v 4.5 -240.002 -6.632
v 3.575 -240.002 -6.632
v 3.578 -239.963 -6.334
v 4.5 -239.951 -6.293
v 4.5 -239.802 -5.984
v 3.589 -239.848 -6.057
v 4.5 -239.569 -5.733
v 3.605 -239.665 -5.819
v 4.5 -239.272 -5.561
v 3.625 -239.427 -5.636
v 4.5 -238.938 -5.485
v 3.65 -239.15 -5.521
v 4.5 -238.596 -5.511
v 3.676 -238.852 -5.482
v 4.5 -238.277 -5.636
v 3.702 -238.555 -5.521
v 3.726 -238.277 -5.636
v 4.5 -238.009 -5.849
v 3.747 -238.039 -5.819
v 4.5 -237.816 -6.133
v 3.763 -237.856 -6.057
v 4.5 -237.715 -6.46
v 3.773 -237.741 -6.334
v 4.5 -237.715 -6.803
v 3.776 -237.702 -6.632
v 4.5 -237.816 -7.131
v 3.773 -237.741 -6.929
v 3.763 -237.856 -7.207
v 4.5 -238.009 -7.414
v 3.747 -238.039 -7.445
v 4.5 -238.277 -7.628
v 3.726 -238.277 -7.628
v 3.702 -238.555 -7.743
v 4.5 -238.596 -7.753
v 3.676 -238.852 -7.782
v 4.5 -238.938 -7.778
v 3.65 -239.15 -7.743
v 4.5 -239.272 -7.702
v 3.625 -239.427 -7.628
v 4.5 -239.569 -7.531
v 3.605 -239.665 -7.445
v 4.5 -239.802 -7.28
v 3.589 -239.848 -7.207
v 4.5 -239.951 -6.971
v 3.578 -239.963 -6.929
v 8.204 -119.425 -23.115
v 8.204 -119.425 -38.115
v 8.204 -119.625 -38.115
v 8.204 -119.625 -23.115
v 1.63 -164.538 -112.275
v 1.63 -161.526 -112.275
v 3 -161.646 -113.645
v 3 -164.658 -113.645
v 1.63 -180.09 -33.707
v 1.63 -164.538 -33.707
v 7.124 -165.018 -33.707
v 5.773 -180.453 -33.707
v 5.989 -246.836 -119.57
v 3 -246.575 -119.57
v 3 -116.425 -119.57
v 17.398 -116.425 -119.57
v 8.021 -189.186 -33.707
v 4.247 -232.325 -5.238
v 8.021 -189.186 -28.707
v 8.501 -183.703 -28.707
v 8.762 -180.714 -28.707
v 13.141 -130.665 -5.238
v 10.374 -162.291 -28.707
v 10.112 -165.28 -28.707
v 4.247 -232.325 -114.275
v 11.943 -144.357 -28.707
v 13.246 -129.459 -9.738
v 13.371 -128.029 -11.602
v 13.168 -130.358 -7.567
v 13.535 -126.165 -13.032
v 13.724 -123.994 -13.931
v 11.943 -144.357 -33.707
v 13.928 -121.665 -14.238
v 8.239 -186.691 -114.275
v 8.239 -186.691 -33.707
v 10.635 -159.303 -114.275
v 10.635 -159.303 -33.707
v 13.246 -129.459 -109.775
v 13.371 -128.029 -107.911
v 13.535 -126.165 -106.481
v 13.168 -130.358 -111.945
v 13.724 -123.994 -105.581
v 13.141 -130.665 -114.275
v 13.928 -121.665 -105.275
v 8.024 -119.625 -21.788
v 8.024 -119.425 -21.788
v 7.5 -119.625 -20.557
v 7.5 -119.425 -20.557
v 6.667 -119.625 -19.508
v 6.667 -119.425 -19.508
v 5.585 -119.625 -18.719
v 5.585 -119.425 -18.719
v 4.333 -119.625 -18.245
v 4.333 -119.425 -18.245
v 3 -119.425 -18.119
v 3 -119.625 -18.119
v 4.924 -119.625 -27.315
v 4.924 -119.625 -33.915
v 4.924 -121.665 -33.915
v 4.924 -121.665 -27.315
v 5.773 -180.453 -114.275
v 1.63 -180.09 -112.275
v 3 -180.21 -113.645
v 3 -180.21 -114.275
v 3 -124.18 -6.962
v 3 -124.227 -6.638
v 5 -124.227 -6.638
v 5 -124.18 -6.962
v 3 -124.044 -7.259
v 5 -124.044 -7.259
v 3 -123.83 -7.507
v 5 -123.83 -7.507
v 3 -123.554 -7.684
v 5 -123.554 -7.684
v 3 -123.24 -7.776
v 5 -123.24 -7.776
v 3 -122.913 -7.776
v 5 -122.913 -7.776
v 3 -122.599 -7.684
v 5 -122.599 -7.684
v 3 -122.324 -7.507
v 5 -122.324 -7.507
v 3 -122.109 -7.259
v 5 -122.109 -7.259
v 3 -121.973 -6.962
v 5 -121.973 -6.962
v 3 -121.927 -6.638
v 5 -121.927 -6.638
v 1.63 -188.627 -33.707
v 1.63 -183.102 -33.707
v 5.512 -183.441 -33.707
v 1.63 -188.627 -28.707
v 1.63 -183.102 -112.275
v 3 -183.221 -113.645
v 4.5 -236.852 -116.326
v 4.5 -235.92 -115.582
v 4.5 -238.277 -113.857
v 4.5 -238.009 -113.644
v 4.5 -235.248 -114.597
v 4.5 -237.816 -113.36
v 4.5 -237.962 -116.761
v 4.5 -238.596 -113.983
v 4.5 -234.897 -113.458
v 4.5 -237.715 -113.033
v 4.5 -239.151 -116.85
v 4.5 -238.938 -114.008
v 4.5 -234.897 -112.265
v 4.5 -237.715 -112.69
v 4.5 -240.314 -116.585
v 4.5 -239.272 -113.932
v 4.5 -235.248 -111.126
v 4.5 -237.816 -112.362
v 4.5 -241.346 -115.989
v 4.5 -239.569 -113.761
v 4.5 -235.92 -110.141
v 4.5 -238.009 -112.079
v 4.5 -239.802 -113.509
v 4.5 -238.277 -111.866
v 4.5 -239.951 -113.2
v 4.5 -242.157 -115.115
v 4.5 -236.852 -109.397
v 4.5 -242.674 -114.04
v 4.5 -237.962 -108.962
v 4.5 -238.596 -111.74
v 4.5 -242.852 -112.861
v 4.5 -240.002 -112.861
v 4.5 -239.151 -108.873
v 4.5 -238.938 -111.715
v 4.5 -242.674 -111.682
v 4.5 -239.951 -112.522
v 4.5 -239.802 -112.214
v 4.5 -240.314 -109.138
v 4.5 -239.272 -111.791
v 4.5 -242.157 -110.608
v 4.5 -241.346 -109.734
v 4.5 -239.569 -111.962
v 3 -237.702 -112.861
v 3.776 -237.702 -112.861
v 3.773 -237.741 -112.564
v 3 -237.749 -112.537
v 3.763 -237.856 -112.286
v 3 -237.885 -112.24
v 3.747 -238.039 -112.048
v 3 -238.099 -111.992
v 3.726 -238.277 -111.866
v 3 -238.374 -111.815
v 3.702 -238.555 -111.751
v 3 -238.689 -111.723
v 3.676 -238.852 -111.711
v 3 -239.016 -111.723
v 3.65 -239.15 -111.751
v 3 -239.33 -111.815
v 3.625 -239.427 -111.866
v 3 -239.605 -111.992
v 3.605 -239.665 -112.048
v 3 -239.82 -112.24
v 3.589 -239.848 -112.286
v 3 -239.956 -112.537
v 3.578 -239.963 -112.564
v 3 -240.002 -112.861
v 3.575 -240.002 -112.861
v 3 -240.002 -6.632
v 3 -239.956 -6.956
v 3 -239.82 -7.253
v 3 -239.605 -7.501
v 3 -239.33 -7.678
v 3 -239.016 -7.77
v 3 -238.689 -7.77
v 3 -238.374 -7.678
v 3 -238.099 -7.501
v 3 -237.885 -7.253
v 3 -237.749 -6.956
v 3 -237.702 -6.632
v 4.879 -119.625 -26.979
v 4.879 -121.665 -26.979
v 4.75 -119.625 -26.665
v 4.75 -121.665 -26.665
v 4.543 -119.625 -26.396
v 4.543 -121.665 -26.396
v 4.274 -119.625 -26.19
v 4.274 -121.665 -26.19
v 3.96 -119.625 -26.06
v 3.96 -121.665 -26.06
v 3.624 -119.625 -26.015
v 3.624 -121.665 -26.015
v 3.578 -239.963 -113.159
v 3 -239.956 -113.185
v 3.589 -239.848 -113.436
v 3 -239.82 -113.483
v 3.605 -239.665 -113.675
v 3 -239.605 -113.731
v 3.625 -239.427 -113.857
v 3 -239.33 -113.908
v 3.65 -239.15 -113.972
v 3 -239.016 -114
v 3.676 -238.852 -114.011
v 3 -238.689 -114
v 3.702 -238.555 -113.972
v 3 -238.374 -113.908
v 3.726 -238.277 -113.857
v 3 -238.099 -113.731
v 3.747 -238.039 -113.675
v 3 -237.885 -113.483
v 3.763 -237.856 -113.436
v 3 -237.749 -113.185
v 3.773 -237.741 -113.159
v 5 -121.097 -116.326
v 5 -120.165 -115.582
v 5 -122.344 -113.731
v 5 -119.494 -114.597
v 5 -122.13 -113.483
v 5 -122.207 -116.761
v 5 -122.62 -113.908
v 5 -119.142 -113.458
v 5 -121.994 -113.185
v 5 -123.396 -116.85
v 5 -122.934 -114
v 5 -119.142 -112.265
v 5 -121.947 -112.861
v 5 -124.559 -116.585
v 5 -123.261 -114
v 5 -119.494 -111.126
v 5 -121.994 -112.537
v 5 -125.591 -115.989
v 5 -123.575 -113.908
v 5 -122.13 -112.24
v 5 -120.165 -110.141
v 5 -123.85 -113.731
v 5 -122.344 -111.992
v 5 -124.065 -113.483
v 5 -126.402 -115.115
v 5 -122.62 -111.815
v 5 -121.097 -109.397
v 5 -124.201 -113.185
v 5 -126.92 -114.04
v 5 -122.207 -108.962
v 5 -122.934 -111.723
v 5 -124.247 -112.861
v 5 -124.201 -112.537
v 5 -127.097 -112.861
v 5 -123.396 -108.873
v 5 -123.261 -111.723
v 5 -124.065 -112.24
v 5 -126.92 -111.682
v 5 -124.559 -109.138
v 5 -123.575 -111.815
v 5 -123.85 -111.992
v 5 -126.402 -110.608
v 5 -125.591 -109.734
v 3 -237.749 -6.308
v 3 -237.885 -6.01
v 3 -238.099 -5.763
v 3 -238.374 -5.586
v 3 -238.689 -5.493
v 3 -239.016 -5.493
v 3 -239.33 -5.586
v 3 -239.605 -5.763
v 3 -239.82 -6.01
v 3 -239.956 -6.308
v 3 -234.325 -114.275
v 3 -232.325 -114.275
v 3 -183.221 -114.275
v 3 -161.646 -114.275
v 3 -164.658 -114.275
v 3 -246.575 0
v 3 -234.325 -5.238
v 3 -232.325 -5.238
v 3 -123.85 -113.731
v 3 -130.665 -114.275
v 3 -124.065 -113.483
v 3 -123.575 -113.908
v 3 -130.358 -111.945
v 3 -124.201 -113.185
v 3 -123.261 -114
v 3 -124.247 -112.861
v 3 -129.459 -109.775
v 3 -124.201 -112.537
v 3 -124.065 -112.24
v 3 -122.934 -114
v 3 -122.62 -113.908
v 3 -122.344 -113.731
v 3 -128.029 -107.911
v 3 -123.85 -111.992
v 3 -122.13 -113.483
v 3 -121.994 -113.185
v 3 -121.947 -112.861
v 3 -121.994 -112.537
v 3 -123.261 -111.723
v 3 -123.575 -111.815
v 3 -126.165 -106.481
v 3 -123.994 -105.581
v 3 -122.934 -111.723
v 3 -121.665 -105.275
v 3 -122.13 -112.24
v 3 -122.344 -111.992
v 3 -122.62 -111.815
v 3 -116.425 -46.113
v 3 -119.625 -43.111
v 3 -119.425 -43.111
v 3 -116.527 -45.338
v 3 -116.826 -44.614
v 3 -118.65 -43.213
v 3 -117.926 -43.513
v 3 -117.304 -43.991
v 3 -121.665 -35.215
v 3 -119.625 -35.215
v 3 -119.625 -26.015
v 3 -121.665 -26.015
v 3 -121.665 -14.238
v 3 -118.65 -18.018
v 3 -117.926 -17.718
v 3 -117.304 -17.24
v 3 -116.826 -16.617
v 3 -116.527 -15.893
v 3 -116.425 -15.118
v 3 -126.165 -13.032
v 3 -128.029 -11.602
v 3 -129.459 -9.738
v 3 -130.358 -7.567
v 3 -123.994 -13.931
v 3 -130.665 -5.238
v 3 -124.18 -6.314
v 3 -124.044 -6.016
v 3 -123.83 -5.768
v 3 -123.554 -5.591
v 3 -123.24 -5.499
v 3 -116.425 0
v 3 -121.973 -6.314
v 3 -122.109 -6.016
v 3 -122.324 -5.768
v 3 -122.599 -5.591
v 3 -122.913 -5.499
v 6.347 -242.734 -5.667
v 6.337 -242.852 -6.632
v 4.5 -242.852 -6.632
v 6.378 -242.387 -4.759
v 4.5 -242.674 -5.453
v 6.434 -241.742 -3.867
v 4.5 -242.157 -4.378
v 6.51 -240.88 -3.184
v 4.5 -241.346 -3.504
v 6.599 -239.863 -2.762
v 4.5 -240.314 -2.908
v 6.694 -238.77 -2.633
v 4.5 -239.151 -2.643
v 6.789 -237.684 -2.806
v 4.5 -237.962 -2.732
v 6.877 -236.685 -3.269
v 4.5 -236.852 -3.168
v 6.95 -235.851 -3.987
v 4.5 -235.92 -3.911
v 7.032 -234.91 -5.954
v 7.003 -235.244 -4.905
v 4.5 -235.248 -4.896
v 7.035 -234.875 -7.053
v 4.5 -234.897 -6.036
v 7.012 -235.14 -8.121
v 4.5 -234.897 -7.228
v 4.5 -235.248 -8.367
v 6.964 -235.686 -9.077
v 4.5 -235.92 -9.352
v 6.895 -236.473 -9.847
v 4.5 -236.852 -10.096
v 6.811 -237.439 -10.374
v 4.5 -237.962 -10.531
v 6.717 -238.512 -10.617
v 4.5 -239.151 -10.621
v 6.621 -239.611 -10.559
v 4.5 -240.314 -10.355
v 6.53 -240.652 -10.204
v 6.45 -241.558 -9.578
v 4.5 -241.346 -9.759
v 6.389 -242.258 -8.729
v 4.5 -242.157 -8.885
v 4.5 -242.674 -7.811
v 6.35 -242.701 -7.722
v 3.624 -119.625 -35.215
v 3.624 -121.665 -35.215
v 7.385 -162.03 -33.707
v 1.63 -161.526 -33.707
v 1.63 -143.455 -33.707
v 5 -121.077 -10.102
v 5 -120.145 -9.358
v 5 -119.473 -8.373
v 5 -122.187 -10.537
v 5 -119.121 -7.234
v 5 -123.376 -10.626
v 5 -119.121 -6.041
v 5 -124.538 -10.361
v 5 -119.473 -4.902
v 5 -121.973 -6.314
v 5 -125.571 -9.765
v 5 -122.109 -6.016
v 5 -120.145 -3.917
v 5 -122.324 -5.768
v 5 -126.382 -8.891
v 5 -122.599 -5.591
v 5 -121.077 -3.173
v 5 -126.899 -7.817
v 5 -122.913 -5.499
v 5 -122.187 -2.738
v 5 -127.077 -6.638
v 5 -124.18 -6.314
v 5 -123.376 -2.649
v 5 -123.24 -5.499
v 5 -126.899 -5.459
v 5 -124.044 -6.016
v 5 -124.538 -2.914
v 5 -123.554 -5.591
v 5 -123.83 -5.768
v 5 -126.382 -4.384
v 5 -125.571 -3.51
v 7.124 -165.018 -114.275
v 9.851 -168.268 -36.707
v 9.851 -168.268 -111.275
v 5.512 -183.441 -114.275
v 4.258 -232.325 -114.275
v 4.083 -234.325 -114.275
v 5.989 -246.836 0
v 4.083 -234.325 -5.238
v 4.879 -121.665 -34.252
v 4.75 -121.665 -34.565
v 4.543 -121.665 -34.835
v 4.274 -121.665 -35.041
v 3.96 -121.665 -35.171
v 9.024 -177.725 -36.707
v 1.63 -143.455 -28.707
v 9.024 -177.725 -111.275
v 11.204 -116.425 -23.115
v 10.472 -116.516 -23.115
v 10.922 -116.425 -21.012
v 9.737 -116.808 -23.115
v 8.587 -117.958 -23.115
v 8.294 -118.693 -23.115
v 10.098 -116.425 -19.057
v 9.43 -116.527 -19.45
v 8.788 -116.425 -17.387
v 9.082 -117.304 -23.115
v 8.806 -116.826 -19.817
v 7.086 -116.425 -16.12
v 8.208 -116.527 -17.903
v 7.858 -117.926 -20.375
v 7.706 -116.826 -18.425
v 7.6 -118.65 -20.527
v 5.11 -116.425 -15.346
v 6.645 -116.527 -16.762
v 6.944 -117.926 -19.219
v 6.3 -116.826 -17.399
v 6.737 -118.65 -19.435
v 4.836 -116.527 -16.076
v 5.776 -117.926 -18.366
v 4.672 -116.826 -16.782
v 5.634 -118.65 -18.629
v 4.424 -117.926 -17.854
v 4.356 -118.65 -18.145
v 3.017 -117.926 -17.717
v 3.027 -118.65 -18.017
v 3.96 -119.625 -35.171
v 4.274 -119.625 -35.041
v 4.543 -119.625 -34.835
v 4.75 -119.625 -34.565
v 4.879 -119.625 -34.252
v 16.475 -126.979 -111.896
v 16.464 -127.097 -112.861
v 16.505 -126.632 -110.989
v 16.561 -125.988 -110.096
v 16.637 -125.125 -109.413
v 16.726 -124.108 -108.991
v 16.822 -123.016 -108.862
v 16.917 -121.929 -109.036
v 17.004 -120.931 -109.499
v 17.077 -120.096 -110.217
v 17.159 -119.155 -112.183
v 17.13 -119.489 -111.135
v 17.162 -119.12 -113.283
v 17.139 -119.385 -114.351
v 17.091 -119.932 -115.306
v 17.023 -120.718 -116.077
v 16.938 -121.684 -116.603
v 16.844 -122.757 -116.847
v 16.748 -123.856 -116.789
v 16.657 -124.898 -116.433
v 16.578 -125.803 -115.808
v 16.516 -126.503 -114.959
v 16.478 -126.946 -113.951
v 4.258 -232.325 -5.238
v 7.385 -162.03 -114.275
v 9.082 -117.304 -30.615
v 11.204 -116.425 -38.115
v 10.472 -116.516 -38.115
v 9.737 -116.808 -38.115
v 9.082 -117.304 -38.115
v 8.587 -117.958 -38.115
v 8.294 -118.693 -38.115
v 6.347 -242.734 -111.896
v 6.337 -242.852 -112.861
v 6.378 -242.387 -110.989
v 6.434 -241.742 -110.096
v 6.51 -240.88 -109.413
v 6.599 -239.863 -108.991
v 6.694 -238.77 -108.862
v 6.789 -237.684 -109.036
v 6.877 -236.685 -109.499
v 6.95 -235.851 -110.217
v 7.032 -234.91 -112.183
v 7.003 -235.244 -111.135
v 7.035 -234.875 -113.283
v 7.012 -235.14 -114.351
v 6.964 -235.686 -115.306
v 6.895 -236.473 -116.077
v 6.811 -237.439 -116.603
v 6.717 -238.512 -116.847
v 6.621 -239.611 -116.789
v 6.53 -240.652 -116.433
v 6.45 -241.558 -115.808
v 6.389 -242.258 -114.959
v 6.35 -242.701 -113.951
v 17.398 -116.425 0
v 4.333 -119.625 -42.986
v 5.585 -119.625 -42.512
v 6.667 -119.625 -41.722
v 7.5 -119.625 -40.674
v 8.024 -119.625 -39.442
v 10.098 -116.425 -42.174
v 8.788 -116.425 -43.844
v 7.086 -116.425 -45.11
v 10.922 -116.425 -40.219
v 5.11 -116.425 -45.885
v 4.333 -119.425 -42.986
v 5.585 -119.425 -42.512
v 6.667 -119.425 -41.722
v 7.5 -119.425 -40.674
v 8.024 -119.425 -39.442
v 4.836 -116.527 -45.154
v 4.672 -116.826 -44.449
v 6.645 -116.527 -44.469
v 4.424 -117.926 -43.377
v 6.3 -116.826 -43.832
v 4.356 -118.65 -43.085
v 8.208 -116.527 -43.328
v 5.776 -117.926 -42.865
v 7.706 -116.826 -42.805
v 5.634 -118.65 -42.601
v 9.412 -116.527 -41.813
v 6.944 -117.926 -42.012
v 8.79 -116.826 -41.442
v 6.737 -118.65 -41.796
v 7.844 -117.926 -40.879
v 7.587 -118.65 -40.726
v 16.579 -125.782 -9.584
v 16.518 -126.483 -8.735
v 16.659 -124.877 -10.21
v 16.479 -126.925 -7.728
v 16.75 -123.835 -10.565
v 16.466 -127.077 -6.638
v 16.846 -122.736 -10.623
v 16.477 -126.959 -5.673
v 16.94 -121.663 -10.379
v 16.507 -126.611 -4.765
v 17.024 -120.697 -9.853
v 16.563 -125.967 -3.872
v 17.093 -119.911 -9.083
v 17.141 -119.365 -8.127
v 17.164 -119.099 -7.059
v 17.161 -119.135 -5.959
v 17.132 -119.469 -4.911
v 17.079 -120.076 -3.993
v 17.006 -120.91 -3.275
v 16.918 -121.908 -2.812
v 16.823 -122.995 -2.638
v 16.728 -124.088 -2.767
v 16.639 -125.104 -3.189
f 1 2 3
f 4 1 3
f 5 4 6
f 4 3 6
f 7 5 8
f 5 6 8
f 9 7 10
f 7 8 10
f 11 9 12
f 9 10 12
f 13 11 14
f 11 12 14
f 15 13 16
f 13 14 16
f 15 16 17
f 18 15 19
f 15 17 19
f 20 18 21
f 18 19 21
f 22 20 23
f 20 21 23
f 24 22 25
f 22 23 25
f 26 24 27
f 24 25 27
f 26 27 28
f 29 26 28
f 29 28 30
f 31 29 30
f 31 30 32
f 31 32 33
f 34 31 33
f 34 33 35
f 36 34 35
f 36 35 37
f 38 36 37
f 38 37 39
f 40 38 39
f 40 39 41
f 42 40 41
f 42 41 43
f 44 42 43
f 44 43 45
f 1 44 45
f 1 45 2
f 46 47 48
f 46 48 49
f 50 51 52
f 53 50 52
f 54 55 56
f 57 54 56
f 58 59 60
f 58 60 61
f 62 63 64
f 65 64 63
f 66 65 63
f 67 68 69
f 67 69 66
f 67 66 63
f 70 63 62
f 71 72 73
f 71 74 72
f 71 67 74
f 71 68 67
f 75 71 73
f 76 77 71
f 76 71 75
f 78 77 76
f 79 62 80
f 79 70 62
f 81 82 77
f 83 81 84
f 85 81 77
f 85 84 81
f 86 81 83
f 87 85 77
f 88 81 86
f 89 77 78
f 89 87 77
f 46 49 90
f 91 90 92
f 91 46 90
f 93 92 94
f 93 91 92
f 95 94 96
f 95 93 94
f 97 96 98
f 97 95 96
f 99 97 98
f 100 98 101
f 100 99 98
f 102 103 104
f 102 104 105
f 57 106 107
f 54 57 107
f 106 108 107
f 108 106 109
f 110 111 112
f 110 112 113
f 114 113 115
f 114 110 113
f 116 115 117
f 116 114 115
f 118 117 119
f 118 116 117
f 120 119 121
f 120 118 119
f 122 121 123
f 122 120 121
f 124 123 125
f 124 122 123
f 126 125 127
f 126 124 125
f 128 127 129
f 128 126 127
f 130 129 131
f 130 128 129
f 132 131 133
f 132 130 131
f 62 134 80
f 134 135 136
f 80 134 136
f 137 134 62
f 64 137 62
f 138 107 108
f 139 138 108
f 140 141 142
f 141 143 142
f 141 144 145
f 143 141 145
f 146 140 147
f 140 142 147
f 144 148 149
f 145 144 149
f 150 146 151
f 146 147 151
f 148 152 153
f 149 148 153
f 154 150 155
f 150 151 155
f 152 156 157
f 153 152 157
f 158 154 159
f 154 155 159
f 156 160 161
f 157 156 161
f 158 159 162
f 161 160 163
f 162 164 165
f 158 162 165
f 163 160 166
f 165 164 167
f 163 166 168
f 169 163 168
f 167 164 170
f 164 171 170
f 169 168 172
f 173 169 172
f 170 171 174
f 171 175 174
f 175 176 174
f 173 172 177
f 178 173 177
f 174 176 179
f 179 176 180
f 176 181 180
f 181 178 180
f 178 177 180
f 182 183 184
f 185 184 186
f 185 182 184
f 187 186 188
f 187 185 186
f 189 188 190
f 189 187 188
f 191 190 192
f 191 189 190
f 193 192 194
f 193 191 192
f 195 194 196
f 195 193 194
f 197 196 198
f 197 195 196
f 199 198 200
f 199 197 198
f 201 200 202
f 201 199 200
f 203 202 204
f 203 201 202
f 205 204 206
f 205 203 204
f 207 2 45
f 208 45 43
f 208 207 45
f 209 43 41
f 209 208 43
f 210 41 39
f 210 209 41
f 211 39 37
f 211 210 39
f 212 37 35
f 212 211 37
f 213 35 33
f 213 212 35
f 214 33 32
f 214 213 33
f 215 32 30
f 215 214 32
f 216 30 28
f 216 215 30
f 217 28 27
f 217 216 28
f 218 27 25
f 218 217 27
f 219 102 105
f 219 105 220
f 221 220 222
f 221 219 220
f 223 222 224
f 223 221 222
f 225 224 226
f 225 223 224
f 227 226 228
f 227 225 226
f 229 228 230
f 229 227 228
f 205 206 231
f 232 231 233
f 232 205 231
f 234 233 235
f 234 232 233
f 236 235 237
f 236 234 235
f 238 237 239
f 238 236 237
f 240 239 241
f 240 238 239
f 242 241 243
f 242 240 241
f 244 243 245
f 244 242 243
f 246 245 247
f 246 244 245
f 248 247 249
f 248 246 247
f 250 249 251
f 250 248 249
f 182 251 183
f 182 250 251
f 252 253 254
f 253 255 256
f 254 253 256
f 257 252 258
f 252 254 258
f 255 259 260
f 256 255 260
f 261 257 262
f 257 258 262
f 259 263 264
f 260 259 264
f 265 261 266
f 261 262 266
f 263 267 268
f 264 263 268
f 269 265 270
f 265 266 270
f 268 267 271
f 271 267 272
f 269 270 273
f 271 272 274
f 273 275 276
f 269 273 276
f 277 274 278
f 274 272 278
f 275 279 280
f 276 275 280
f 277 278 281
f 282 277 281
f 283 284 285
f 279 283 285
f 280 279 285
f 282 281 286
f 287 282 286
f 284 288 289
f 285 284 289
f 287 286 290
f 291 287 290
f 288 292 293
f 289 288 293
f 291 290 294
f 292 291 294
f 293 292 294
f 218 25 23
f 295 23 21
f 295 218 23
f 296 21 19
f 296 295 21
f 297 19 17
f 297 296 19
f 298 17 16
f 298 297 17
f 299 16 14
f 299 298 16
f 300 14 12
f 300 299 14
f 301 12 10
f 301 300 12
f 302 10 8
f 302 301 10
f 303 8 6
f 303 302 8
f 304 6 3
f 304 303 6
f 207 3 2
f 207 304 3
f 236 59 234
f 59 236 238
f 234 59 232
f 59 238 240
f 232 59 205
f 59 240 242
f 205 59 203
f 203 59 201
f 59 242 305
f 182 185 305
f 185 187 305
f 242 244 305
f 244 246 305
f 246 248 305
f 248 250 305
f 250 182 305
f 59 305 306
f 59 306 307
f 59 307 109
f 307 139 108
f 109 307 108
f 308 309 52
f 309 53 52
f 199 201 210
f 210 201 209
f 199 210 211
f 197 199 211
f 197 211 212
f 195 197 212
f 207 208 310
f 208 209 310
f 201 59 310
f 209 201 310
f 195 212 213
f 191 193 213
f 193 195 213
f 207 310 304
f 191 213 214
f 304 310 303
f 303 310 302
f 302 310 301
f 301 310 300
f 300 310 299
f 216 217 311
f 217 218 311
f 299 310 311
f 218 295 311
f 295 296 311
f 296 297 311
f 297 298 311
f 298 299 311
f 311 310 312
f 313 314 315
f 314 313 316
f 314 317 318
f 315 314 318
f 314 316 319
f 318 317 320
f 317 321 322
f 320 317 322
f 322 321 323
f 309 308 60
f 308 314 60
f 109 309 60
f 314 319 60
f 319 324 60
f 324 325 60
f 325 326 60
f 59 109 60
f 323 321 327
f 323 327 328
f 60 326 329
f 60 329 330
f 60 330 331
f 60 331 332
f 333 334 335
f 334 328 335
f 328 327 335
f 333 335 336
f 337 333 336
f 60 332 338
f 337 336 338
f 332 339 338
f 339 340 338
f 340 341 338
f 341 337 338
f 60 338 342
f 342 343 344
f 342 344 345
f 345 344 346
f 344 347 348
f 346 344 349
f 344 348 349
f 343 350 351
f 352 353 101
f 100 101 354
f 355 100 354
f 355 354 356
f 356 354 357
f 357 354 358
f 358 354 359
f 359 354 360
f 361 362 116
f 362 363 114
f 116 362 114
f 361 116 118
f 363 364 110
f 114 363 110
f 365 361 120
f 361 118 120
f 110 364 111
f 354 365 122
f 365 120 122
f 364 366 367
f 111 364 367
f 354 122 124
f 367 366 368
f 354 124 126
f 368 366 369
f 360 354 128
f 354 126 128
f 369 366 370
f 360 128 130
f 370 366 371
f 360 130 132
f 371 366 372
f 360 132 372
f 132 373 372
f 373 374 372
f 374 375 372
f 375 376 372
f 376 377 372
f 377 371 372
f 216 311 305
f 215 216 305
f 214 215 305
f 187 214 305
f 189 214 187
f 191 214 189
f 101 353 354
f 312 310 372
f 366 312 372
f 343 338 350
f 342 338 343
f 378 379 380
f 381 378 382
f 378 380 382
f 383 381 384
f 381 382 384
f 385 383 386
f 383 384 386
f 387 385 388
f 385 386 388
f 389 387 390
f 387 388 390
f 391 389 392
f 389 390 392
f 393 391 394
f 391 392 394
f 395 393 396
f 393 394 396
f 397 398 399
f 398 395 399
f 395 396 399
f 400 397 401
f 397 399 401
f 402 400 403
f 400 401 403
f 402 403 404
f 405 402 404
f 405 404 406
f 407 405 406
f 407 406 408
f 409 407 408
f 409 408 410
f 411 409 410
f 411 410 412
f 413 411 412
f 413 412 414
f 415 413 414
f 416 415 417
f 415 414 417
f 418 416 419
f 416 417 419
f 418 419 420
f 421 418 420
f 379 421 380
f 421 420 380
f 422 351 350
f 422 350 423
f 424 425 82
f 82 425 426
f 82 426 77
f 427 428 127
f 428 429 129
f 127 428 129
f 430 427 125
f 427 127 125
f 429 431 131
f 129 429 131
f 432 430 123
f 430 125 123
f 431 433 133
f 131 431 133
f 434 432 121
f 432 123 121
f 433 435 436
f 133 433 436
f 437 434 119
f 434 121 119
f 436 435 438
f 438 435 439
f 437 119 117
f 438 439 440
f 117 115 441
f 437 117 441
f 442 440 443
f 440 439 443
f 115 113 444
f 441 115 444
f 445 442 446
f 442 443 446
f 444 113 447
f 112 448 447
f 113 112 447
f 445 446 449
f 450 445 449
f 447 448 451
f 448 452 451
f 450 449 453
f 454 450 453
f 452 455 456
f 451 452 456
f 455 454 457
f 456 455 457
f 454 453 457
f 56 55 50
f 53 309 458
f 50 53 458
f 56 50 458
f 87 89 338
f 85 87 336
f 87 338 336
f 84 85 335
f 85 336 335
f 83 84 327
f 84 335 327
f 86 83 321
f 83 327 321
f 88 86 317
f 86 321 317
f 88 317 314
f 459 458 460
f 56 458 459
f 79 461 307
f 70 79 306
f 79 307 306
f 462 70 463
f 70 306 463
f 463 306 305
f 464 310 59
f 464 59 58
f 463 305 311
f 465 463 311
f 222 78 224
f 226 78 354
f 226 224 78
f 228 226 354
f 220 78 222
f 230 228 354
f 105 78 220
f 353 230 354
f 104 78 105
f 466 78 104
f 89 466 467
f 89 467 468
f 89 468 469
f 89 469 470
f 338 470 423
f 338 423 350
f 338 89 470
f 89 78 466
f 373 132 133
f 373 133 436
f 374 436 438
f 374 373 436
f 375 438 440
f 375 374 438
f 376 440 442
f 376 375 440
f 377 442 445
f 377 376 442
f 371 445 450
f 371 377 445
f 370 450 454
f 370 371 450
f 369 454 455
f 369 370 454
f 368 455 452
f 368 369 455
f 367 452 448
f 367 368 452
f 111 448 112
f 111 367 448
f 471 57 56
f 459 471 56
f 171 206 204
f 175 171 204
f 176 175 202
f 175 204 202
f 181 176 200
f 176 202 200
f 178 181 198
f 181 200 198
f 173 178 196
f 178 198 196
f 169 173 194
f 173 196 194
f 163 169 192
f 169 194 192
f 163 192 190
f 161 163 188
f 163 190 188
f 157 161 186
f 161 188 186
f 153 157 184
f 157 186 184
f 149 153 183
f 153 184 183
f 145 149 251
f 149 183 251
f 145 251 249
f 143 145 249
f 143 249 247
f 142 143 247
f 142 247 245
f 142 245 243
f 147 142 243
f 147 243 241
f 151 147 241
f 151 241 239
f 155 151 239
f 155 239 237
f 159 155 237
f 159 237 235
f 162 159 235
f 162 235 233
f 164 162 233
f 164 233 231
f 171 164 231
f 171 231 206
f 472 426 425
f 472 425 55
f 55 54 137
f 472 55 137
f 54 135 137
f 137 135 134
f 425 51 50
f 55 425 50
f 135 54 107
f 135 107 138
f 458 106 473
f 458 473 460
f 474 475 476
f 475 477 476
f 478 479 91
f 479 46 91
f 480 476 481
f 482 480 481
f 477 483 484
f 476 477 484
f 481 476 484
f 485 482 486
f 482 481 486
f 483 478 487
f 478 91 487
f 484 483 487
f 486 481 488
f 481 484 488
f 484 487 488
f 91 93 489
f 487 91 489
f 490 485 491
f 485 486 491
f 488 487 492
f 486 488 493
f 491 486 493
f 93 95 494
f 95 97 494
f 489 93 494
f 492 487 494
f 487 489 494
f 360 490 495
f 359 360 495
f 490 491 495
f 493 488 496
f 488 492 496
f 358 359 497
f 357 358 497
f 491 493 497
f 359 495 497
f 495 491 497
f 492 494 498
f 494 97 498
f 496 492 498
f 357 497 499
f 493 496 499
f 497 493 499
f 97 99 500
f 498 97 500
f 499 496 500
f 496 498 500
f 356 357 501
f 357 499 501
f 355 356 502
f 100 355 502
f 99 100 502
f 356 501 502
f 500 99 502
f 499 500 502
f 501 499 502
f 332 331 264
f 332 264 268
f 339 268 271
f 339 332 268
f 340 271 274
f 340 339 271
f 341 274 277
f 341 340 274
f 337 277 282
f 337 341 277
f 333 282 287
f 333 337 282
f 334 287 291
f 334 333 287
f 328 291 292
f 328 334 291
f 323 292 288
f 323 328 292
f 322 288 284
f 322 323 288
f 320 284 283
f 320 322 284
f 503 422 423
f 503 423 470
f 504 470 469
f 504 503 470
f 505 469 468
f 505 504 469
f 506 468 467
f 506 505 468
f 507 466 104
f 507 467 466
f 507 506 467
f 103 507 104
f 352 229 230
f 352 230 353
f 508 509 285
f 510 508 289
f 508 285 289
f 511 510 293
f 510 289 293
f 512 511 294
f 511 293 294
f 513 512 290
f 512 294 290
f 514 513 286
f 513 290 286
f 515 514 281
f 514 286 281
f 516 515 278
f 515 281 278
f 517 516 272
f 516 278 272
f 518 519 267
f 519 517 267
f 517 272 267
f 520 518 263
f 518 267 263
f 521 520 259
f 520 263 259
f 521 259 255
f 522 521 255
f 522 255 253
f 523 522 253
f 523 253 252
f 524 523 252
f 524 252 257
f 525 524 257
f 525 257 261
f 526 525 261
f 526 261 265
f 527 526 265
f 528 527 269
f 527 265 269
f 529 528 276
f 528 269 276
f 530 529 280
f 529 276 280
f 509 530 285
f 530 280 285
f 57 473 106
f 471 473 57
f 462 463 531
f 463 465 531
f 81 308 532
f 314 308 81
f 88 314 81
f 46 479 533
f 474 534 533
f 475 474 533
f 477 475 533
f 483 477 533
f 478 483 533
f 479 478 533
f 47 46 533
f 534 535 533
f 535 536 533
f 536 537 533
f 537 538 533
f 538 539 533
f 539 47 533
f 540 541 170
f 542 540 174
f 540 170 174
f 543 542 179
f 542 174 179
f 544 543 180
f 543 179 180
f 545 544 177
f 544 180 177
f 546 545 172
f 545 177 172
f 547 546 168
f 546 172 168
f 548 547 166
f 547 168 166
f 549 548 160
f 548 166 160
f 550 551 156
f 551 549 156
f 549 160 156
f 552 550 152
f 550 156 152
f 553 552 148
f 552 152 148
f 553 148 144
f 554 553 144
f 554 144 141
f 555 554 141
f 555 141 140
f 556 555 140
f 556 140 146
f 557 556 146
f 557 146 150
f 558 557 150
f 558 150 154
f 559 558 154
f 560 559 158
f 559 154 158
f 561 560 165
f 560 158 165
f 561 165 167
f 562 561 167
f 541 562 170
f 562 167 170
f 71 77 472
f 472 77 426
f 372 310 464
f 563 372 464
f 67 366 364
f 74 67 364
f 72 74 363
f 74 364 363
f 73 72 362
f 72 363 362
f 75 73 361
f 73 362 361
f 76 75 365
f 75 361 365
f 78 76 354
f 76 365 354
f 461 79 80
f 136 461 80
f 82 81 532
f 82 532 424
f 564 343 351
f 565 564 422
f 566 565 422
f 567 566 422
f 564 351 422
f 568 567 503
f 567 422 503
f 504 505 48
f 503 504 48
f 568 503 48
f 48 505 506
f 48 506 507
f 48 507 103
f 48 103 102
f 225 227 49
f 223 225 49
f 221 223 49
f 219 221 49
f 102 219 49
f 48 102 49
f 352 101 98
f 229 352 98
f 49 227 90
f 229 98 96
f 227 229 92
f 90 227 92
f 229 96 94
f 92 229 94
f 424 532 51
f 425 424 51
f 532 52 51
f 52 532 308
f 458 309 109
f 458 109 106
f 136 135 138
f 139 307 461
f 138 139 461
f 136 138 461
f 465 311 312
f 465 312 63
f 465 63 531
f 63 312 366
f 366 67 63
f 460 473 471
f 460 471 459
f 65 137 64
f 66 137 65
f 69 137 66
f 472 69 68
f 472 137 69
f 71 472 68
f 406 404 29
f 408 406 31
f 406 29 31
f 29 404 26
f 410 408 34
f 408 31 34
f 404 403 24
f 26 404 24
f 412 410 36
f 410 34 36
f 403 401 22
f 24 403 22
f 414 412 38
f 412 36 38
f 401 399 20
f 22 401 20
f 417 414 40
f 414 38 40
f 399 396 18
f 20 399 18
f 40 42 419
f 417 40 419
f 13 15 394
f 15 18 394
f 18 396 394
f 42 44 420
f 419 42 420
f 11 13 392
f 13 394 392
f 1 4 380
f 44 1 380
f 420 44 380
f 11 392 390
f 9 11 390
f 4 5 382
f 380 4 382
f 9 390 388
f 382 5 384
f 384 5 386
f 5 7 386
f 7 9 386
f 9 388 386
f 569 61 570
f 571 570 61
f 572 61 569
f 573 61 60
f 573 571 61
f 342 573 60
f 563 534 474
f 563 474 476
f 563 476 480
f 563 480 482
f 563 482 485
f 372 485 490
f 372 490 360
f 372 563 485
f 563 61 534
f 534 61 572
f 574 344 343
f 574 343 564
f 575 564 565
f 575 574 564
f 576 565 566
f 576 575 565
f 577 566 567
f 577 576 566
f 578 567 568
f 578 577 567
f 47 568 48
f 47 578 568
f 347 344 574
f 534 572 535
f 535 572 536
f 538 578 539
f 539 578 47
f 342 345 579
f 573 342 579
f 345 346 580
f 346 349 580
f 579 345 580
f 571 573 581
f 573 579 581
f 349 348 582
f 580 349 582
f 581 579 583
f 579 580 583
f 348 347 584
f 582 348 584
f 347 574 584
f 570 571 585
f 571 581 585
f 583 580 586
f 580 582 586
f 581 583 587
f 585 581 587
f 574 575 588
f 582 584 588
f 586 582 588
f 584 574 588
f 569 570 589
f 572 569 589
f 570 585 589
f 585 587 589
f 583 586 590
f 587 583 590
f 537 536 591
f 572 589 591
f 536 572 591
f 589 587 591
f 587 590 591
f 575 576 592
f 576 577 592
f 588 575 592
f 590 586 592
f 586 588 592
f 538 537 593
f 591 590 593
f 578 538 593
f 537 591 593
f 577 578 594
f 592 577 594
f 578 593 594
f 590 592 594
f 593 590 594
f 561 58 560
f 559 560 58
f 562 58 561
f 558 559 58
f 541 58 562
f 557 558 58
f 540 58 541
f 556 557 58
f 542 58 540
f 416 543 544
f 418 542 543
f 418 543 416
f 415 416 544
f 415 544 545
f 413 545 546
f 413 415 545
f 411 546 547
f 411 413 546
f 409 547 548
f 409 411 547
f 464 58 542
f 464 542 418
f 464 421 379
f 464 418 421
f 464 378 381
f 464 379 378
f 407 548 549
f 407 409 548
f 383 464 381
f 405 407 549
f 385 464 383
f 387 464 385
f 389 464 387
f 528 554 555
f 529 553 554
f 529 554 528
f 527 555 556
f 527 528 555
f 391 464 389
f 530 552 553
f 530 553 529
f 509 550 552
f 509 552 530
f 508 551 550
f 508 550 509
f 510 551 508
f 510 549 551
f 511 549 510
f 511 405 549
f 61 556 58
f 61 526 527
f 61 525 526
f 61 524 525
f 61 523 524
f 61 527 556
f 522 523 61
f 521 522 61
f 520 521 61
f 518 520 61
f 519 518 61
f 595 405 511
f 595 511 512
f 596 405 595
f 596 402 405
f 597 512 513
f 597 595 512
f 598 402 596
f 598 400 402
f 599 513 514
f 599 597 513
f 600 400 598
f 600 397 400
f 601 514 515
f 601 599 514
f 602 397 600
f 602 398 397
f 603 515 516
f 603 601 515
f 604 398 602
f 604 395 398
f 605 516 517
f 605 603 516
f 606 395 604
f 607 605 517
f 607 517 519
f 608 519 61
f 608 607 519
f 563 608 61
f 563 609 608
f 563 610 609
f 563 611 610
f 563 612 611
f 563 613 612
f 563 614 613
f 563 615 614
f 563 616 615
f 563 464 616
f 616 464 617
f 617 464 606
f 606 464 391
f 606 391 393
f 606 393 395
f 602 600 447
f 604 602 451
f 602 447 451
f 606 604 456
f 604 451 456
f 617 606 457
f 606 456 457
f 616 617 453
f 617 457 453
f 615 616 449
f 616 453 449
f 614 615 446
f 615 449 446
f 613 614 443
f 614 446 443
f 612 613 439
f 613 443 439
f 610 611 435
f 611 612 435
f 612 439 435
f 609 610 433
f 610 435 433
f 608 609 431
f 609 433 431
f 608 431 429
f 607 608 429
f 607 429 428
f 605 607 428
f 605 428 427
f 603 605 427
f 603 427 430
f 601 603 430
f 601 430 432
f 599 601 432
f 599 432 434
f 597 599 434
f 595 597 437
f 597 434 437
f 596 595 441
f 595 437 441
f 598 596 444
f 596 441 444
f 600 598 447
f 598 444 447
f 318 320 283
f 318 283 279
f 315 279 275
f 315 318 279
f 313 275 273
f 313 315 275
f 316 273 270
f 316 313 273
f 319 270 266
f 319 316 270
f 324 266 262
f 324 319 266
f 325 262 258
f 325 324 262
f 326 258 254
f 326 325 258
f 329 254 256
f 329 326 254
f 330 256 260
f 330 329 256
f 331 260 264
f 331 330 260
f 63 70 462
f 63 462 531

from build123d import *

# Parameters (mm, degrees)
BOSS_EXTRUDE1_DEPTH       = 119.57
CUT_EXTRUDE1_START        = -114.274828565
CUT_EXTRUDE1_DEPTH        = 109.036999581
BOSS_EXTRUDE2_OUTLINE_R   = 1.15
BOSS_EXTRUDE2_DEPTH       = 12
BOSS_EXTRUDE2_2_OUTLINE_W = 8
BOSS_EXTRUDE2_2_OUTLINE_H = 109.036999581
BOSS_EXTRUDE2_2_OUTLINE_R = 1.15
BOSS_EXTRUDE2_2_DEPTH     = 1.246713455
BOSS_EXTRUDE4_START       = -114.274828565
BOSS_EXTRUDE4_DEPTH       = 85.567402499
BOSS_EXTRUDE4_START_2     = -33.707426066
BOSS_EXTRUDE4_2_DEPTH     = 5
CHAMFER6_SIZE             = 2
CHAMFER7_SIZE             = 3
CHAMFER8_SIZE             = 3
SKETCH10_R                = 1.15
CUT_EXTRUDE2_DEPTH        = 40
CUT_EXTRUDE5_START        = -2
SKETCH11_R                = 4
CUT_EXTRUDE5_DEPTH        = 29
CUT_EXTRUDE6_START        = -1.5
SKETCH14_R                = 4
CUT_EXTRUDE6_DEPTH        = 29
CUT_EXTRUDE8_DEPTH        = 21
CUT_EXTRUDE9_DEPTH        = 3.2
FILLET2_SIZE              = 3
CUT_EXTRUDE11_REACH       = 276.65
SKETCH17_W                = 2
SKETCH17_H                = 109.036999581


with BuildPart() as part:
    # Sketch1 → Boss-Extrude1 (new body)
    with BuildSketch(Plane.XY):
        Polygon((3, -246.574899039), (5.988584094, -246.836366267), (17.398099188, -116.425012), (3, -116.425012), align=None)
    extrude(amount=-BOSS_EXTRUDE1_DEPTH)

    # Cut-Extrude1: read off the stored shape, not the designer's step
    # Cut-Extrude1 outline → Cut-Extrude1 (cut)
    with BuildSketch(Plane.XY.offset(CUT_EXTRUDE1_START)):
        Polygon((3, -240.324899039), (3.546804147, -240.324899039), (13.928199078, -121.665012), (3, -121.665012), align=None)
    extrude(amount=CUT_EXTRUDE1_DEPTH, mode=Mode.SUBTRACT)

    # Boss-Extrude2: read off the stored shape, not the designer's step
    # Boss-Extrude2 outline → Boss-Extrude2 (add)
    # profile 1 of 2: a face of its own
    with BuildSketch(Plane.YZ.offset(3)):
        with BuildLine():
            ThreePointArc((-121.665012, -105.274828565), (-128.028973031, -107.910867534), (-130.665012, -114.274828565))
            Line((-130.665012, -114.274828565), (-121.665012, -114.274828565))
            Line((-121.665012, -114.274828565), (-121.665012, -105.274828565))
        make_face()
        with Locations((-123.097401734, -112.861435085)):
            Circle(BOSS_EXTRUDE2_OUTLINE_R, mode=Mode.SUBTRACT)
    # profile 2 of 2: a face of its own
    with BuildSketch(Plane.YZ.offset(3)):
        with BuildLine():
            ThreePointArc((-130.665012, -5.237828984), (-128.02897303, -11.601790014), (-121.665012, -14.237828984))
            Line((-121.665012, -14.237828984), (-121.665012, -5.237828984))
            Line((-121.665012, -5.237828984), (-130.665012, -5.237828984))
        make_face()
        with Locations((-123.076755271, -6.637532276)):
            Circle(BOSS_EXTRUDE2_OUTLINE_R, mode=Mode.SUBTRACT)
    extrude(amount=BOSS_EXTRUDE2_DEPTH)

    # Boss-Extrude2 2 outline → Boss-Extrude2 2 (add)
    with BuildSketch(Plane.YZ.offset(3)):
        with Locations((-236.324899039, -59.756328775)):
            Rectangle(BOSS_EXTRUDE2_2_OUTLINE_W, BOSS_EXTRUDE2_2_OUTLINE_H)
        with Locations((-238.852206599, -112.861435085)):
            Circle(BOSS_EXTRUDE2_2_OUTLINE_R, mode=Mode.SUBTRACT)
        with Locations((-238.852206599, -6.631689226)):
            Circle(BOSS_EXTRUDE2_2_OUTLINE_R, mode=Mode.SUBTRACT)
    extrude(amount=BOSS_EXTRUDE2_2_DEPTH)

    # Boss-Extrude4: read off the stored shape, not the designer's step
    # Boss-Extrude4 outline → Boss-Extrude4 (add)
    with BuildSketch(Plane.XY.offset(BOSS_EXTRUDE4_START)):
        Polygon((10.373859962, -162.291294), (1.63, -161.526305378), (1.63, -164.53776489), (10.112392734, -165.279878094), align=None)
        Polygon((8.762077136, -180.714056005), (1.63, -180.090080109), (1.63, -183.101539621), (8.500609907, -183.7026401), align=None)
    extrude(amount=BOSS_EXTRUDE4_DEPTH)

    # Boss-Extrude4 2 outline → Boss-Extrude4 2 (add)
    with BuildSketch(Plane.XY.offset(BOSS_EXTRUDE4_START_2)):
        Polygon((11.942877213, -144.35734476), (1.63, -143.455084916), (1.63, -161.526305378), (10.373859962, -162.291294), align=None)
        Polygon((10.112392734, -165.279878094), (1.63, -164.53776489), (1.63, -180.090080109), (8.762077136, -180.714056005), align=None)
        Polygon((8.500609907, -183.7026401), (1.63, -183.101539621), (1.63, -188.626977605), (8.020868789, -189.186106174), align=None)
    extrude(amount=BOSS_EXTRUDE4_2_DEPTH)

    # Chamfer6
    # the kernel refuses this chamfer: 2 mm, written as the material it takes off along each edge
    with BuildSketch(Plane(origin=(1.63, -174.946714133, -114.274828565), x_dir=(0, 0, 1), z_dir=(0, -1, 0))) as chamfer6_piece_1_section:
        Polygon((CHAMFER6_SIZE, 0), (0, -CHAMFER6_SIZE), (0, 0), align=None)
    chamfer6_piece_1 = extrude(amount=13.298191464, mode=Mode.PRIVATE)
    chamfer6_piece_1 = split(chamfer6_piece_1, bisect_by=Plane(origin=(3, -174.946714133, -114.274828565), z_dir=(-1, 0, 0)), keep=Keep.TOP, mode=Mode.PRIVATE)
    add(chamfer6_piece_1, mode=Mode.SUBTRACT)
    with BuildSketch(Plane(origin=(1.63, -156.382939402, -114.274828565), x_dir=(0, 0, 1), z_dir=(0, -1, 0))) as chamfer6_piece_2_section:
        Polygon((CHAMFER6_SIZE, 0), (0, -CHAMFER6_SIZE), (0, 0), align=None)
    chamfer6_piece_2 = extrude(amount=13.298191464, mode=Mode.PRIVATE)
    chamfer6_piece_2 = split(chamfer6_piece_2, bisect_by=Plane(origin=(3, -156.382939402, -114.274828565), z_dir=(-1, 0, 0)), keep=Keep.TOP, mode=Mode.PRIVATE)
    add(chamfer6_piece_2, mode=Mode.SUBTRACT)

    # Chamfer7
    chamfer7_edges = [part.edges().sort_by_distance(p)[0] for p in [
        (10.112392734, -165.279878094, -73.991127315),
        (8.762077136, -180.714056005, -73.991127315),
        (9.437234935, -172.99696705, -33.707426066),
        (9.437234935, -172.996967049, -114.274828565),
    ]]
    chamfer(chamfer7_edges, length=CHAMFER7_SIZE)

    # Chamfer8
    chamfer8_edges = [part.edges().sort_by_distance(p)[0] for p in [
        (8.500609907, -183.7026401, -73.991127315),
        (10.373859962, -162.291294, -73.991127315),
    ]]
    chamfer(chamfer8_edges, length=CHAMFER8_SIZE)

    # Sketch10 → Cut-Extrude2 (cut)
    with BuildSketch(Plane(origin=(3, 0, 0), x_dir=(0, -1, 0), z_dir=(-1, 0, 0))):
        with Locations((123.097401734, -112.861435085)):
            Circle(SKETCH10_R)
        with Locations((123.076755271, -6.637532276)):
            Circle(SKETCH10_R)
        with Locations((238.852206599, -6.631689226)):
            Circle(SKETCH10_R)
        with Locations((238.852206599, -112.861435085)):
            Circle(SKETCH10_R)
    extrude(amount=-CUT_EXTRUDE2_DEPTH, mode=Mode.SUBTRACT)

    # Sketch11 → Cut-Extrude5 (cut)
    with BuildSketch(Plane(origin=(3, 0, 0), x_dir=(0, -1, 0), z_dir=(-1, 0, 0)).offset(CUT_EXTRUDE5_START)):
        with Locations((123.097401734, -112.861435085)):
            Circle(SKETCH11_R)
        with Locations((123.076755271, -6.637532276)):
            Circle(SKETCH11_R)
    extrude(amount=-CUT_EXTRUDE5_DEPTH, mode=Mode.SUBTRACT)

    # Sketch14 → Cut-Extrude6 (cut)
    with BuildSketch(Plane(origin=(3, 0, 0), x_dir=(0, -1, 0), z_dir=(-1, 0, 0)).offset(CUT_EXTRUDE6_START)):
        with Locations((238.852206599, -6.631689226)):
            Circle(SKETCH14_R)
        with Locations((238.852206599, -112.861435085)):
            Circle(SKETCH14_R)
    extrude(amount=-CUT_EXTRUDE6_DEPTH, mode=Mode.SUBTRACT)

    # Sketch15 → Cut-Extrude8 (cut)
    with BuildSketch(Plane(origin=(0, -116.425012, 0), x_dir=(-1, 0, 0), z_dir=(0, 1, 0))):
        with BuildLine():
            Line((-3.623758546, -26.015341992), (-2.783758546, -26.015341992))
            ThreePointArc((-2.783758546, -26.015341992), (-1.864519731, -26.396103177), (-1.483758546, -27.315341992))
            Line((-1.483758546, -27.315341992), (-1.483758546, -33.915341992))
            ThreePointArc((-1.483758546, -33.915341992), (-1.864519731, -34.834580808), (-2.783758546, -35.215341992))
            Line((-2.783758546, -35.215341992), (-3.623758546, -35.215341992))
            ThreePointArc((-3.623758546, -35.215341992), (-4.542997362, -34.834580808), (-4.923758546, -33.915341992))
            Line((-4.923758546, -33.915341992), (-4.923758546, -27.315341992))
            ThreePointArc((-4.923758546, -27.315341992), (-4.542997362, -26.396103177), (-3.623758546, -26.015341992))
        make_face()
    extrude(amount=-CUT_EXTRUDE8_DEPTH, mode=Mode.SUBTRACT)

    # Sketch16 → Cut-Extrude9 (cut)
    with BuildSketch(Plane(origin=(0, -116.425012, 0), x_dir=(-1, 0, 0), z_dir=(0, 1, 0))):
        with BuildLine():
            Line((-8.203758546, -38.115341992), (-8.203758546, -23.115341992))
            ThreePointArc((-8.203758546, -23.115341992), (-3.203758546, -18.115341992), (1.796241454, -23.115341992))
            Line((1.796241454, -23.115341992), (1.796241454, -38.115341992))
            ThreePointArc((1.796241454, -38.115341992), (-3.203758546, -43.115341992), (-8.203758546, -38.115341992))
        make_face()
    extrude(amount=-CUT_EXTRUDE9_DEPTH, mode=Mode.SUBTRACT)

    # Fillet2
    # a fillet whose section is not a circle: 3 mm, written as the material it takes off along each edge
    with BuildSketch(Plane(origin=(3.203758546, -116.425012, -23.115341992), x_dir=(1, 0, 0), z_dir=(0, 0, -1))) as fillet2_piece_1:
        with BuildLine():
            Bezier((5 + FILLET2_SIZE, 0), (5, 0), (5, FILLET2_SIZE), weights=[1, 0.707106781, 1])
            Line((5, FILLET2_SIZE), (5, 0))
            Line((5, 0), (5 + FILLET2_SIZE, 0))
        make_face()
    revolve(axis=Axis((3.203758546, -116.425012, -23.115341992), (0, -1, 0)), revolution_arc=178.315556871, mode=Mode.SUBTRACT)
    with BuildSketch(Plane(origin=(8.203758546, -116.425012, -38.115341992), x_dir=(1, 0, 0), z_dir=(0, 0, 1))) as fillet2_piece_2:
        with BuildLine():
            Bezier((FILLET2_SIZE, 0), (0, 0), (0, -FILLET2_SIZE), weights=[1, 0.707106781, 1])
            Line((0, -FILLET2_SIZE), (0, 0))
            Line((0, 0), (FILLET2_SIZE, 0))
        make_face()
    extrude(amount=15, mode=Mode.SUBTRACT)
    with BuildSketch(Plane(origin=(3.203758546, -116.425012, -38.115341992), x_dir=(-0.9995678782122136, 0, -0.02939484387325848), z_dir=(-0.02939484387325848, 0, 0.9995678782122136))) as fillet2_piece_3:
        with BuildLine():
            Bezier((5 + FILLET2_SIZE, 0), (5, 0), (5, FILLET2_SIZE), weights=[1, 0.707106781, 1])
            Line((5, FILLET2_SIZE), (5, 0))
            Line((5, 0), (5 + FILLET2_SIZE, 0))
        make_face()
    revolve(axis=Axis((3.203758546, -116.425012, -38.115341992), (0, -1, 0)), revolution_arc=178.315556871, mode=Mode.SUBTRACT)

    # Cut-Extrude11: up to this plane
    cut_extrude11_end = Plane(origin=(2.988584094, -246.836366267, -119.57), z_dir=(0.9961946980917459, -0.08715574274765435, 0))
    # Sketch17 → Cut-Extrude11 (cut, up to the surface)
    with BuildSketch(Plane(origin=(3, 0, 0), x_dir=(0, -1, 0), z_dir=(-1, 0, 0)), mode=Mode.PRIVATE) as cut_extrude11_sk1:
        with Locations((233.324899039, -59.756328775)):
            Rectangle(SKETCH17_W, SKETCH17_H)
    cut_extrude11_tool1 = split(extrude(cut_extrude11_sk1.sketch, amount=-CUT_EXTRUDE11_REACH, mode=Mode.PRIVATE), bisect_by=cut_extrude11_end, keep=Keep.BOTH, mode=Mode.PRIVATE)
    add(cut_extrude11_tool1.solids().sort_by_distance((3, -233.324899, -59.756329))[0], mode=Mode.SUBTRACT)


solid = part.part
